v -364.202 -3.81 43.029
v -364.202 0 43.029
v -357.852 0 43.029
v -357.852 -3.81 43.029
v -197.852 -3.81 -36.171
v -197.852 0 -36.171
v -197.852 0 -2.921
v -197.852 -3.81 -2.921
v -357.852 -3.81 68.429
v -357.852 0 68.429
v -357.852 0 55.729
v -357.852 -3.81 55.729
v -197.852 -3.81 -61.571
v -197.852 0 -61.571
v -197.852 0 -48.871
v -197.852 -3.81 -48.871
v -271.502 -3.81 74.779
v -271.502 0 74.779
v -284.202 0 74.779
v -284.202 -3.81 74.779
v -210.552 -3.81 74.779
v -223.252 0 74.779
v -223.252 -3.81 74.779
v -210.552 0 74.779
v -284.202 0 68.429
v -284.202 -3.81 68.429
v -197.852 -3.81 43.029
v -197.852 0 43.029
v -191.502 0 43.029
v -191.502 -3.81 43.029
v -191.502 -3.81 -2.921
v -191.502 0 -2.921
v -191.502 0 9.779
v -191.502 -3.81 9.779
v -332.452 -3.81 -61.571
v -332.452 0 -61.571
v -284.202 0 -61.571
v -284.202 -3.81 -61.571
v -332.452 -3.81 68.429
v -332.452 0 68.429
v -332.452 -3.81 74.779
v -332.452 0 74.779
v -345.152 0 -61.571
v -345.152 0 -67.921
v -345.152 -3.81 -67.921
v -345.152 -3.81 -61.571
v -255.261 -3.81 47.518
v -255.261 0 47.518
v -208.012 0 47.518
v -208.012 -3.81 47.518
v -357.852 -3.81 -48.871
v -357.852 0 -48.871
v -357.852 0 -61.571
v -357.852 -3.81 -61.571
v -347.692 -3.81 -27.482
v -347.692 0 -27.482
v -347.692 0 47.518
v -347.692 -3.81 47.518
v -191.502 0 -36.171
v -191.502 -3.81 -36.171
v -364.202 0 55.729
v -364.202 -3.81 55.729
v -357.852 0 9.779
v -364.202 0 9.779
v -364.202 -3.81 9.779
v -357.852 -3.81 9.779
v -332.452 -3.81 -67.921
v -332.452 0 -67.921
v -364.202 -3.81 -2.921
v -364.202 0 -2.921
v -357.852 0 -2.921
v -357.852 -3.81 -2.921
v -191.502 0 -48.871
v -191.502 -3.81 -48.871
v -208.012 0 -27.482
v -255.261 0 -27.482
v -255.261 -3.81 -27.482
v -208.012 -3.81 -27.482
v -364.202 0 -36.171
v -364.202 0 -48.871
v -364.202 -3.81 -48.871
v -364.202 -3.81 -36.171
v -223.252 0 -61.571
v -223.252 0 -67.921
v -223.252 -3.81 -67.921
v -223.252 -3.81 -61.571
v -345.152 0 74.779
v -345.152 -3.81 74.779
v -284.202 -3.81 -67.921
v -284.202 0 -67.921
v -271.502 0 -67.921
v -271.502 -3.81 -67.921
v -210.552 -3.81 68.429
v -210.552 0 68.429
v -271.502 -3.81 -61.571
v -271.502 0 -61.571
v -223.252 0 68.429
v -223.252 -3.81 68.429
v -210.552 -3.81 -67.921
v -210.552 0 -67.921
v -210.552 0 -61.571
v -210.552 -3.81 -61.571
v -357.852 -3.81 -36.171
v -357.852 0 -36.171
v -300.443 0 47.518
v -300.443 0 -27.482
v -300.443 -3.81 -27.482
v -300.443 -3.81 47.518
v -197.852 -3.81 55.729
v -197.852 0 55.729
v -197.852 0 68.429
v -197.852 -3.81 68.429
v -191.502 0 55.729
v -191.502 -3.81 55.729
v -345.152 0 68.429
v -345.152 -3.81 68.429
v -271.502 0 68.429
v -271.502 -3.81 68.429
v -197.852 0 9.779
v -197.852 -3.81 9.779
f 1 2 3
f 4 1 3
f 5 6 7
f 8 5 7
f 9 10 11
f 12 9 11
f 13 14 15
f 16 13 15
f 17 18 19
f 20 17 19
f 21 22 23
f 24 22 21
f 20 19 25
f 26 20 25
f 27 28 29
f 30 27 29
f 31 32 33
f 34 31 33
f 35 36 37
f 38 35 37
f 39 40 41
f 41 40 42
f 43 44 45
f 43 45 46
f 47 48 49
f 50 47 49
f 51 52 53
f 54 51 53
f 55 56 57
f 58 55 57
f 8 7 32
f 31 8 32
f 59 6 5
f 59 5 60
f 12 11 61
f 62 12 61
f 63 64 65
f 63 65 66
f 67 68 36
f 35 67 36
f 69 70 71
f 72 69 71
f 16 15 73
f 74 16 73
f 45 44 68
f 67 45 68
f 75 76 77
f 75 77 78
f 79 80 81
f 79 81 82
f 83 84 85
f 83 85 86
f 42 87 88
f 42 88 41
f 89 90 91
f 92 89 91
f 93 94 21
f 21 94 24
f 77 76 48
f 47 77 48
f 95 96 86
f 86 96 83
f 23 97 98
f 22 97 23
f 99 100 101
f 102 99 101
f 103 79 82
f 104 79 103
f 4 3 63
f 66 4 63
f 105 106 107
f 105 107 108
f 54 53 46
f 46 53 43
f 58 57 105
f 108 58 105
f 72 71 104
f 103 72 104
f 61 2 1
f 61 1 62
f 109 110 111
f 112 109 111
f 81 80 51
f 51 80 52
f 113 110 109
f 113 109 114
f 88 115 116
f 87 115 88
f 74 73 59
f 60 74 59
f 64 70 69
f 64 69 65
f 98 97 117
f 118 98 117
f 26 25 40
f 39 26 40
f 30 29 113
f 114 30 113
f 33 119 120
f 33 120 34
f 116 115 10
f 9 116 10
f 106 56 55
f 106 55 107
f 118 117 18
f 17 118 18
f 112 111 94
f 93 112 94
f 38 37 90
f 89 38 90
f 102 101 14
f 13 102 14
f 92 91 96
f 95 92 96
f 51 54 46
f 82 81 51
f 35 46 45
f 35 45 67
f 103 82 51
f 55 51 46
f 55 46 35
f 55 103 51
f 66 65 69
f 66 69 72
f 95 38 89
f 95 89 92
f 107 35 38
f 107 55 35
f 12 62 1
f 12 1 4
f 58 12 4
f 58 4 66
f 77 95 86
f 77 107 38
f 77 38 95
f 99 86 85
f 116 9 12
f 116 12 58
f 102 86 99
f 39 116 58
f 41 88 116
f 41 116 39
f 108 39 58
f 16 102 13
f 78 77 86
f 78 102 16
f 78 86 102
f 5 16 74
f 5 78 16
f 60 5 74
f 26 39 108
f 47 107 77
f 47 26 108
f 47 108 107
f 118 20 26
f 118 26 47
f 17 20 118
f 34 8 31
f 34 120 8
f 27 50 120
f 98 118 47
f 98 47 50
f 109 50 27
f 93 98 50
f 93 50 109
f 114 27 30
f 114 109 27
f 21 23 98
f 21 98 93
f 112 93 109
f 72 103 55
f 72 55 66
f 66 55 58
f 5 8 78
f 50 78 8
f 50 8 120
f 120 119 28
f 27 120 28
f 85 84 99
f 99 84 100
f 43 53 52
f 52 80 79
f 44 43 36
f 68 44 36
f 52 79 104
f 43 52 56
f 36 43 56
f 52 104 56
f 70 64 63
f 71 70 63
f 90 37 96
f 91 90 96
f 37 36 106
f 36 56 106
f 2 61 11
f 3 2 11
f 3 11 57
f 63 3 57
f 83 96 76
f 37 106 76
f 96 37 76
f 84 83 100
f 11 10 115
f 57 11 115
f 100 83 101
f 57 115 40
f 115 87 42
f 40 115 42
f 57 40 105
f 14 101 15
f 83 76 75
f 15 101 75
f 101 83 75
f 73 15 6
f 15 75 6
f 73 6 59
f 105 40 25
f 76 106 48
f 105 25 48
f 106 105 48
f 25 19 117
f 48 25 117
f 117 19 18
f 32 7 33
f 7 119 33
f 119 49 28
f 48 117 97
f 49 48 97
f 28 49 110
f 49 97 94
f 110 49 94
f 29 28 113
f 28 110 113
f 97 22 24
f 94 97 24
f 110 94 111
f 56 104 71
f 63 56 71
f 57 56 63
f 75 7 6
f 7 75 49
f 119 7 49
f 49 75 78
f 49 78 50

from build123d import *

# Parameters (mm, degrees)
F0_W     = 6.35
F0_H     = 12.7
F0_W_2   = 47.2488999367
F0_H_2   = 75
F0_W_3   = 12.7
F0_H_3   = 6.35
F1_DEPTH = 3.81


# Not quite as in the source:
# - a feature names something its author has since deleted; it is built from what else it names


with BuildPart() as f1:
    # F0 (on Front) → F1 (new body)
    with BuildSketch(Plane.XZ):
        with Locations((-354.6769669852, 49.3793434303)):
            Rectangle(F0_W, F0_H)
        with Locations((-361.0269669852, 49.3793434303)):
            Rectangle(F0_W, F0_H)
        Polygon((-332.4519669852, -61.5706565697), (-284.2019669852, -61.5706565697), (-284.2019669852, -55.2206565697), (-277.8519669852, -55.2206565697), (-277.8519669852, 62.0793434303), (-284.2019669852, 62.0793434303), (-284.2019669852, 68.4293434303), (-332.4519669852, 68.4293434303), (-332.4519669852, 62.0793434303), (-345.1519669852, 62.0793434303), (-345.1519669852, 68.4293434303), (-357.8519669852, 68.4293434303), (-357.8519669852, 55.7293434303), (-351.5019669852, 55.7293434303), (-351.5019669852, 43.0293434303), (-357.8519669852, 43.0293434303), (-357.8519669852, 9.7793434303), (-351.5019669852, 9.7793434303), (-351.5019669852, -2.9206565697), (-357.8519669852, -2.9206565697), (-357.8519669852, -36.1706565697), (-351.5019669852, -36.1706565697), (-351.5019669852, -48.8706565697), (-357.8519669852, -48.8706565697), (-357.8519669852, -61.5706565697), (-345.1519669852, -61.5706565697), (-345.1519669852, -55.2206565697), (-332.4519669852, -55.2206565697), align=None)
        with Locations((-324.0675170169, 10.0176490168)):
            Rectangle(F0_W_2, F0_H_2, mode=Mode.SUBTRACT)
        with Locations((-338.8019669852, 65.2543434303)):
            Rectangle(F0_W_3, F0_H_3)
        with Locations((-338.8019669852, 71.6043434303)):
            Rectangle(F0_W_3, F0_H_3)
        Polygon((-210.5519669852, -61.5706565697), (-197.8519669852, -61.5706565697), (-197.8519669852, -48.8706565697), (-204.2019669852, -48.8706565697), (-204.2019669852, -36.1706565697), (-197.8519669852, -36.1706565697), (-197.8519669852, -2.9206565697), (-204.2019669852, -2.9206565697), (-204.2019669852, 9.7793434303), (-197.8519669852, 9.7793434303), (-197.8519669852, 43.0293434303), (-204.2019669852, 43.0293434303), (-204.2019669852, 55.7293434303), (-197.8519669852, 55.7293434303), (-197.8519669852, 68.4293434303), (-210.5519669852, 68.4293434303), (-210.5519669852, 62.0793434303), (-223.2519669852, 62.0793434303), (-223.2519669852, 68.4293434303), (-271.5019669852, 68.4293434303), (-271.5019669852, 62.0793434303), (-277.8519669852, 62.0793434303), (-277.8519669852, -55.2206565697), (-271.5019669852, -55.2206565697), (-271.5019669852, -61.5706565697), (-223.2519669852, -61.5706565697), (-223.2519669852, -55.2206565697), (-210.5519669852, -55.2206565697), align=None)
        with Locations((-231.6364169536, 10.0176490168)):
            Rectangle(F0_W_2, F0_H_2, mode=Mode.SUBTRACT)
        Polygon((-284.2019669852, 68.4293434303), (-277.8519669852, 68.4293434303), (-271.5019669852, 68.4293434303), (-271.5019669852, 74.7793434303), (-284.2019669852, 74.7793434303), align=None)
        with Locations((-274.6769669852, 65.2543434303)):
            Rectangle(F0_W, F0_H_3)
        with Locations((-281.0269669852, 65.2543434303)):
            Rectangle(F0_W, F0_H_3)
        with Locations((-216.9019669852, 71.6043434303)):
            Rectangle(F0_W_3, F0_H_3)
        with Locations((-216.9019669852, 65.2543434303)):
            Rectangle(F0_W_3, F0_H_3)
        with Locations((-354.6769669852, 3.4293434303)):
            Rectangle(F0_W, F0_H)
        with Locations((-361.0269669852, 3.4293434303)):
            Rectangle(F0_W, F0_H)
        with Locations((-361.0269669852, -42.5206565697)):
            Rectangle(F0_W, F0_H)
        with Locations((-338.8019669852, -64.7456565697)):
            Rectangle(F0_W_3, F0_H_3)
        with Locations((-354.6769669852, -42.5206565697)):
            Rectangle(F0_W, F0_H)
        with Locations((-338.8019669852, -58.3956565697)):
            Rectangle(F0_W_3, F0_H_3)
        with Locations((-281.0269669852, -58.3956565697)):
            Rectangle(F0_W, F0_H_3)
        with Locations((-274.6769669852, -58.3956565697)):
            Rectangle(F0_W, F0_H_3)
        Polygon((-271.5019669852, -67.9206565697), (-271.5019669852, -61.5706565697), (-277.8519669852, -61.5706565697), (-284.2019669852, -61.5706565697), (-284.2019669852, -67.9206565697), align=None)
        with Locations((-216.9019669852, -64.7456565697)):
            Rectangle(F0_W_3, F0_H_3)
        with Locations((-216.9019669852, -58.3956565697)):
            Rectangle(F0_W_3, F0_H_3)
        with Locations((-201.0269669852, -42.5206565697)):
            Rectangle(F0_W, F0_H)
        with Locations((-194.6769669852, -42.5206565697)):
            Rectangle(F0_W, F0_H)
        with Locations((-201.0269669852, 3.4293434303)):
            Rectangle(F0_W, F0_H)
        with Locations((-194.6769669852, 3.4293434303)):
            Rectangle(F0_W, F0_H)
        with Locations((-201.0269669852, 49.3793434303)):
            Rectangle(F0_W, F0_H)
        with Locations((-194.6769669852, 49.3793434303)):
            Rectangle(F0_W, F0_H)
    extrude(amount=F1_DEPTH)


solid = f1.part
